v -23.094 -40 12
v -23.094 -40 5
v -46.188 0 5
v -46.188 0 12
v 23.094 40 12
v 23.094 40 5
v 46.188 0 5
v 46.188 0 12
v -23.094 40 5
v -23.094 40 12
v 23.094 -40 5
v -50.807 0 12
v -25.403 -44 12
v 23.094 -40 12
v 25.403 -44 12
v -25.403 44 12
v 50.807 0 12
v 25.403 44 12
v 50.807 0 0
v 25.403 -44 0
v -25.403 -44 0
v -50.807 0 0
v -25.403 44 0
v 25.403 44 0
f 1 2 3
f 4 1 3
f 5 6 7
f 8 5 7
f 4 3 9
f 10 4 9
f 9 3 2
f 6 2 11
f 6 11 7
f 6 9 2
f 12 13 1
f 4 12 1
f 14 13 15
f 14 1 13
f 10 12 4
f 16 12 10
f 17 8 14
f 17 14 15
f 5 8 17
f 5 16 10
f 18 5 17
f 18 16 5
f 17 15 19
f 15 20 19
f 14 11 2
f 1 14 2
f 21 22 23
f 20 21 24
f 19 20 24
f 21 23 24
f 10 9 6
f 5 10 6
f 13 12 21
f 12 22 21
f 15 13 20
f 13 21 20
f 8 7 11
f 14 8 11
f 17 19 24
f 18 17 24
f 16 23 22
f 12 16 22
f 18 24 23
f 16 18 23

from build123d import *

# Parameters (mm, degrees)
F1_DEPTH = 5
F3_DEPTH = 7


with BuildPart() as f1:
    # F0 (on Top) → F1 (new body)
    with BuildSketch(Plane.XY):
        Polygon((-25.4034118443, 44), (-50.8068236887, 0), (-25.4034118443, -44), (25.4034118443, -44), (50.8068236887, 0), (25.4034118443, 44), align=None)
        Polygon((-23.0940107676, -40), (-46.1880215352, 0), (-23.0940107676, 40), (23.0940107676, 40), (46.1880215352, 0), (23.0940107676, -40), align=None, mode=Mode.SUBTRACT)
        Polygon((-23.0940107676, 40), (-46.1880215352, 0), (-23.0940107676, -40), (23.0940107676, -40), (46.1880215352, 0), (23.0940107676, 40), align=None)
    extrude(amount=F1_DEPTH)

    # F2 (on face) → F3 (join)
    with BuildSketch(Plane.XY.offset(5)):
        Polygon((-25.4034118443, 44), (-50.8068236887, 0), (-25.4034118443, -44), (25.4034118443, -44), (50.8068236887, 0), (25.4034118443, 44), align=None)
        Polygon((-23.0940107676, -40), (-46.1880215352, 0), (-23.0940107676, 40), (23.0940107676, 40), (46.1880215352, 0), (23.0940107676, -40), align=None, mode=Mode.SUBTRACT)
    extrude(amount=F3_DEPTH)


solid = f1.part
